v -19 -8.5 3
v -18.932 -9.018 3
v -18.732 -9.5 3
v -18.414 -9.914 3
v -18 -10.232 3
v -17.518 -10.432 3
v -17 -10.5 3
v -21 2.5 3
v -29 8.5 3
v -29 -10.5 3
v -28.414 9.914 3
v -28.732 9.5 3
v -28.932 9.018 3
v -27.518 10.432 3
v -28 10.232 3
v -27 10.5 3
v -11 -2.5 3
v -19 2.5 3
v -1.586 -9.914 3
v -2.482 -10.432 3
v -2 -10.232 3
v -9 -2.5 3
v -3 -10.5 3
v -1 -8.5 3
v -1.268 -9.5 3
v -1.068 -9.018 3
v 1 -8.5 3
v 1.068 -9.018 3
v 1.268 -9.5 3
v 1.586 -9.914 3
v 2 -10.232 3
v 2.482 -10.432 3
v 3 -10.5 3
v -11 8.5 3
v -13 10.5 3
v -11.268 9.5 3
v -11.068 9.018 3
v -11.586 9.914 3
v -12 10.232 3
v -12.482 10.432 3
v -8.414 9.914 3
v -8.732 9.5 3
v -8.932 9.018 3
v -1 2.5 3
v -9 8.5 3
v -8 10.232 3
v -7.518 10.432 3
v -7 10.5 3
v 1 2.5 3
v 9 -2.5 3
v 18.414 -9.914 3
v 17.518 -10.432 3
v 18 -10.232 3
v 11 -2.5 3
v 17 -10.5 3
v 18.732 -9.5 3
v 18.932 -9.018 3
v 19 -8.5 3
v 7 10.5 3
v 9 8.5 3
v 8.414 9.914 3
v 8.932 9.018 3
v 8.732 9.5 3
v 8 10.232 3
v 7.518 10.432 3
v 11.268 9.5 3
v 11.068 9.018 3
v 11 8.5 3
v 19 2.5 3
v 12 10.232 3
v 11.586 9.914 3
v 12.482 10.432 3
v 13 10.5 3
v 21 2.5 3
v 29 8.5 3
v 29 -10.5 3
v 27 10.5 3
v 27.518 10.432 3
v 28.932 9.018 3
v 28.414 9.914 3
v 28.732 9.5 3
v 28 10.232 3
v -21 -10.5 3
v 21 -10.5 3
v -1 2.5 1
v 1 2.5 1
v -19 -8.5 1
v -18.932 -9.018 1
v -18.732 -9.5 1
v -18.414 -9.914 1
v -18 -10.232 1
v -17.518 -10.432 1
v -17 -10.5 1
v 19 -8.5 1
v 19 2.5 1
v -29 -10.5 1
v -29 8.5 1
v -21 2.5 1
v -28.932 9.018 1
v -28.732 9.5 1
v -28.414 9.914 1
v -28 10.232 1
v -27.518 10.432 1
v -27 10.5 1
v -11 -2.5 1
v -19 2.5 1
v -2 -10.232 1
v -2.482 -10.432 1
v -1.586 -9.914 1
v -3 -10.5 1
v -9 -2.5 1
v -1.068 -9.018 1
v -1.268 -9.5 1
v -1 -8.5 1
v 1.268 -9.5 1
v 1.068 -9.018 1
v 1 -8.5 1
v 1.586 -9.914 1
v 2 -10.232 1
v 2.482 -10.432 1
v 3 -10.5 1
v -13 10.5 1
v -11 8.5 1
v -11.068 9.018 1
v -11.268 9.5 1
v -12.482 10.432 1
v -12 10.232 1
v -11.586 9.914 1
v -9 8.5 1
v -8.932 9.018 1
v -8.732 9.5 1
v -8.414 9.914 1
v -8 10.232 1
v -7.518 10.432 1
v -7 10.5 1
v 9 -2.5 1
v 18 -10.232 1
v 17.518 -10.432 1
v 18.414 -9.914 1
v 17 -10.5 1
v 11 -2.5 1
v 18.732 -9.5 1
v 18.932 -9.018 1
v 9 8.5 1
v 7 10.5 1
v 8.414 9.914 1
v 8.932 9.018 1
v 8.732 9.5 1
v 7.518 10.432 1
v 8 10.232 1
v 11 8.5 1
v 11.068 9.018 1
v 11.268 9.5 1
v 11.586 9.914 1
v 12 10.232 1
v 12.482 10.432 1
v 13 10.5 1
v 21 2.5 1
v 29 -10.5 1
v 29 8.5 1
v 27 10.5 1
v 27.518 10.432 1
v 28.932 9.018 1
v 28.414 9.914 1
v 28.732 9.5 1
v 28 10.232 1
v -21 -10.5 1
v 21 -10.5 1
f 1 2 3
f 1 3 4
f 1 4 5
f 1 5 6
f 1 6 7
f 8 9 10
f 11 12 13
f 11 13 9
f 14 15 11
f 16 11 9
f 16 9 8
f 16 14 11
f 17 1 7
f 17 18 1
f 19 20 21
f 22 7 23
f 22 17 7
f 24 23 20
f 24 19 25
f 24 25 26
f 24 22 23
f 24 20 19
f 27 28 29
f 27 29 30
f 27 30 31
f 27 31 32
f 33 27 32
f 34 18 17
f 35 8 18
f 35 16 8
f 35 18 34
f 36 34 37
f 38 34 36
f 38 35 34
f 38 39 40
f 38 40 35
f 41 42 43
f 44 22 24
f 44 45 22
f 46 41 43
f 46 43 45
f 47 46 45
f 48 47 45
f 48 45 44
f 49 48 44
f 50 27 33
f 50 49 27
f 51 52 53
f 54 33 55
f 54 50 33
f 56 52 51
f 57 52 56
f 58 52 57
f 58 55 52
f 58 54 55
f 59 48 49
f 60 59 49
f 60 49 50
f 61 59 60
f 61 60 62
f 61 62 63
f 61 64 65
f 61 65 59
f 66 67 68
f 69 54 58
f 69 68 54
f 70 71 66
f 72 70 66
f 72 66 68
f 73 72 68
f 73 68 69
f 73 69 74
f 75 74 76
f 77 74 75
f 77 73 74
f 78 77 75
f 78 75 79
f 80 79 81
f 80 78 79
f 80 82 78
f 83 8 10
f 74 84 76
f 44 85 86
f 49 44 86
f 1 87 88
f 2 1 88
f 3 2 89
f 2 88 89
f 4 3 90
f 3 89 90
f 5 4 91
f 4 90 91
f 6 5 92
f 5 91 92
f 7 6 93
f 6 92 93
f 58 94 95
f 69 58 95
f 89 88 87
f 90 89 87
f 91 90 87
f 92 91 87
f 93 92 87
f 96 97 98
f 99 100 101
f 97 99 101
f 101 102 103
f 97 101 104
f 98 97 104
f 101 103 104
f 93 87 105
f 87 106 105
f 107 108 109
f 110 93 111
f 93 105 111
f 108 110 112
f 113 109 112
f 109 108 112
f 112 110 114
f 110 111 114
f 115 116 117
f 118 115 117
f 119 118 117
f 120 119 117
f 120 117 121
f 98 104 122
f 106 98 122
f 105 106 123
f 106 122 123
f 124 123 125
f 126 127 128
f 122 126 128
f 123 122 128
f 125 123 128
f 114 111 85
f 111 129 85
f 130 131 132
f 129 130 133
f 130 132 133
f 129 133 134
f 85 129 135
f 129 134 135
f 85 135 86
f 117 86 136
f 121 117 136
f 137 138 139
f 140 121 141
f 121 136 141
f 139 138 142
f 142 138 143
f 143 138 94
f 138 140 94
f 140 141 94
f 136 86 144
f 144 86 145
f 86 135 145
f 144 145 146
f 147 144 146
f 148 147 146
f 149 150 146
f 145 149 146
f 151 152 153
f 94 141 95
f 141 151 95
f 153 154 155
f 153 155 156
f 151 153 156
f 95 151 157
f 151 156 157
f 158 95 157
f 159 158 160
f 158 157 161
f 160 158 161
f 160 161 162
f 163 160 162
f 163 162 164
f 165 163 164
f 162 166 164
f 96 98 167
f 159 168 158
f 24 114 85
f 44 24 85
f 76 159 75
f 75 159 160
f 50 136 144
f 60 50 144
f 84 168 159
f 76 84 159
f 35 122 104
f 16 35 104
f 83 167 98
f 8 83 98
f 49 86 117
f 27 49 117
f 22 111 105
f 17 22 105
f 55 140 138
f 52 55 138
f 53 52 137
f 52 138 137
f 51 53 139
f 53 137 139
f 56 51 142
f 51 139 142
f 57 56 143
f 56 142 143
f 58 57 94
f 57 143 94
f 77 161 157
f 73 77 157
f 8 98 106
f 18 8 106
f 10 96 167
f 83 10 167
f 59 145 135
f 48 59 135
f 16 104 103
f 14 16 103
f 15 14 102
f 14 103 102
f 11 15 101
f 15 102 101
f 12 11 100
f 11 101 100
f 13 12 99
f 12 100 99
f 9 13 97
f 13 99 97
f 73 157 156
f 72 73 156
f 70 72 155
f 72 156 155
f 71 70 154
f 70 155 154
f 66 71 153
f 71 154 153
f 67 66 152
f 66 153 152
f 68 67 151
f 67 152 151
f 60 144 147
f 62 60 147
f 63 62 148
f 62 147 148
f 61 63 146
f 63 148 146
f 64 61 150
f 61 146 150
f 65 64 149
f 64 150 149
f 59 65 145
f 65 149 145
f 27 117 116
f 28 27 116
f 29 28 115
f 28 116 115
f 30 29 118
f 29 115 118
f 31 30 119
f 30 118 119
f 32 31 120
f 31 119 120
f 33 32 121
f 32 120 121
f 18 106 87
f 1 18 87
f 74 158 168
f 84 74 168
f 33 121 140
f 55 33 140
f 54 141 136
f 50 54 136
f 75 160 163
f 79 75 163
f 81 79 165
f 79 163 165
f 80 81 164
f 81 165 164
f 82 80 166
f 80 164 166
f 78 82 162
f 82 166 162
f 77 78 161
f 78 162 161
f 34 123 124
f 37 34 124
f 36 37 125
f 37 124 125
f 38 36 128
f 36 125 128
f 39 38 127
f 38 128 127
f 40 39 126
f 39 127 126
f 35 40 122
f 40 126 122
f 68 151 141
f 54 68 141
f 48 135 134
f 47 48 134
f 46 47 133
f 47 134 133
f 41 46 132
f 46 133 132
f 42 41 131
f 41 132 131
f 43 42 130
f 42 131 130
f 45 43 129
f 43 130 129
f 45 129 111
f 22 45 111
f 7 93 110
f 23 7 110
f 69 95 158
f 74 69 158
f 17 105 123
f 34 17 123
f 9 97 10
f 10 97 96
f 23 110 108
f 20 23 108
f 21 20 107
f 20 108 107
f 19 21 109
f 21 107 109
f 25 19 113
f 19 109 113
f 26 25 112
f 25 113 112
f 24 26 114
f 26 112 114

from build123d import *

# Parameters (mm, degrees)
F0_W      = 62
F0_H      = 25
F1_DEPTH  = 1
F3_DEPTH  = 2
F1_FACE_W = 62
F1_FACE_H = 25
F4_DEPTH  = 1


with BuildPart() as f1:
    # F0 (on Top) → F1 (new body)
    with BuildSketch(Plane.XY):
        Rectangle(F0_W, F0_H)
    extrude(amount=F1_DEPTH)

    # F2 (on face) → F3 (join)
    with BuildSketch(Plane.XY.offset(1)):
        with BuildLine():
            Line((-13, 10.5), (-27, 10.5))
            ThreePointArc((-27, 10.5), (-28.414214, 9.914214), (-29, 8.5))
            Line((-29, 8.5), (-29, -10.5))
            Line((-29, -10.5), (-21, -10.5))
            Line((-21, -10.5), (-21, 2.5))
            Line((-21, 2.5), (-19, 2.5))
            Line((-19, 2.5), (-19, -8.5))
            ThreePointArc((-19, -8.5), (-18.414214, -9.914214), (-17, -10.5))
            Line((-17, -10.5), (-3, -10.5))
            ThreePointArc((-3, -10.5), (-1.585786, -9.914214), (-1, -8.5))
            Line((-1, -8.5), (-1, 2.5))
            Line((-1, 2.5), (1, 2.5))
            Line((1, 2.5), (1, -8.5))
            ThreePointArc((1, -8.5), (1.585786, -9.914214), (3, -10.5))
            Line((3, -10.5), (17, -10.5))
            ThreePointArc((17, -10.5), (18.414214, -9.914214), (19, -8.5))
            Line((19, -8.5), (19, 2.5))
            Line((19, 2.5), (21, 2.5))
            Line((21, 2.5), (21, -10.5))
            Line((21, -10.5), (29, -10.5))
            Line((29, -10.5), (29, 8.5))
            ThreePointArc((29, 8.5), (28.414214, 9.914214), (27, 10.5))
            Line((27, 10.5), (13, 10.5))
            ThreePointArc((13, 10.5), (11.585786, 9.914214), (11, 8.5))
            Line((11, 8.5), (11, -2.5))
            Line((11, -2.5), (9, -2.5))
            Line((9, -2.5), (9, 8.5))
            ThreePointArc((9, 8.5), (8.414214, 9.914214), (7, 10.5))
            Line((7, 10.5), (-7, 10.5))
            ThreePointArc((-7, 10.5), (-8.414214, 9.914214), (-9, 8.5))
            Line((-9, 8.5), (-9, -2.5))
            Line((-9, -2.5), (-11, -2.5))
            Line((-11, -2.5), (-11, 8.5))
            ThreePointArc((-11, 8.5), (-11.585786, 9.914214), (-13, 10.5))
        make_face()
    extrude(amount=F3_DEPTH)

    # F1_face (on face) → F4 (cut)
    with BuildSketch(Plane.XY.offset(1)):
        Rectangle(F1_FACE_W, F1_FACE_H)
    extrude(amount=-F4_DEPTH, mode=Mode.SUBTRACT)


solid = f1.part
